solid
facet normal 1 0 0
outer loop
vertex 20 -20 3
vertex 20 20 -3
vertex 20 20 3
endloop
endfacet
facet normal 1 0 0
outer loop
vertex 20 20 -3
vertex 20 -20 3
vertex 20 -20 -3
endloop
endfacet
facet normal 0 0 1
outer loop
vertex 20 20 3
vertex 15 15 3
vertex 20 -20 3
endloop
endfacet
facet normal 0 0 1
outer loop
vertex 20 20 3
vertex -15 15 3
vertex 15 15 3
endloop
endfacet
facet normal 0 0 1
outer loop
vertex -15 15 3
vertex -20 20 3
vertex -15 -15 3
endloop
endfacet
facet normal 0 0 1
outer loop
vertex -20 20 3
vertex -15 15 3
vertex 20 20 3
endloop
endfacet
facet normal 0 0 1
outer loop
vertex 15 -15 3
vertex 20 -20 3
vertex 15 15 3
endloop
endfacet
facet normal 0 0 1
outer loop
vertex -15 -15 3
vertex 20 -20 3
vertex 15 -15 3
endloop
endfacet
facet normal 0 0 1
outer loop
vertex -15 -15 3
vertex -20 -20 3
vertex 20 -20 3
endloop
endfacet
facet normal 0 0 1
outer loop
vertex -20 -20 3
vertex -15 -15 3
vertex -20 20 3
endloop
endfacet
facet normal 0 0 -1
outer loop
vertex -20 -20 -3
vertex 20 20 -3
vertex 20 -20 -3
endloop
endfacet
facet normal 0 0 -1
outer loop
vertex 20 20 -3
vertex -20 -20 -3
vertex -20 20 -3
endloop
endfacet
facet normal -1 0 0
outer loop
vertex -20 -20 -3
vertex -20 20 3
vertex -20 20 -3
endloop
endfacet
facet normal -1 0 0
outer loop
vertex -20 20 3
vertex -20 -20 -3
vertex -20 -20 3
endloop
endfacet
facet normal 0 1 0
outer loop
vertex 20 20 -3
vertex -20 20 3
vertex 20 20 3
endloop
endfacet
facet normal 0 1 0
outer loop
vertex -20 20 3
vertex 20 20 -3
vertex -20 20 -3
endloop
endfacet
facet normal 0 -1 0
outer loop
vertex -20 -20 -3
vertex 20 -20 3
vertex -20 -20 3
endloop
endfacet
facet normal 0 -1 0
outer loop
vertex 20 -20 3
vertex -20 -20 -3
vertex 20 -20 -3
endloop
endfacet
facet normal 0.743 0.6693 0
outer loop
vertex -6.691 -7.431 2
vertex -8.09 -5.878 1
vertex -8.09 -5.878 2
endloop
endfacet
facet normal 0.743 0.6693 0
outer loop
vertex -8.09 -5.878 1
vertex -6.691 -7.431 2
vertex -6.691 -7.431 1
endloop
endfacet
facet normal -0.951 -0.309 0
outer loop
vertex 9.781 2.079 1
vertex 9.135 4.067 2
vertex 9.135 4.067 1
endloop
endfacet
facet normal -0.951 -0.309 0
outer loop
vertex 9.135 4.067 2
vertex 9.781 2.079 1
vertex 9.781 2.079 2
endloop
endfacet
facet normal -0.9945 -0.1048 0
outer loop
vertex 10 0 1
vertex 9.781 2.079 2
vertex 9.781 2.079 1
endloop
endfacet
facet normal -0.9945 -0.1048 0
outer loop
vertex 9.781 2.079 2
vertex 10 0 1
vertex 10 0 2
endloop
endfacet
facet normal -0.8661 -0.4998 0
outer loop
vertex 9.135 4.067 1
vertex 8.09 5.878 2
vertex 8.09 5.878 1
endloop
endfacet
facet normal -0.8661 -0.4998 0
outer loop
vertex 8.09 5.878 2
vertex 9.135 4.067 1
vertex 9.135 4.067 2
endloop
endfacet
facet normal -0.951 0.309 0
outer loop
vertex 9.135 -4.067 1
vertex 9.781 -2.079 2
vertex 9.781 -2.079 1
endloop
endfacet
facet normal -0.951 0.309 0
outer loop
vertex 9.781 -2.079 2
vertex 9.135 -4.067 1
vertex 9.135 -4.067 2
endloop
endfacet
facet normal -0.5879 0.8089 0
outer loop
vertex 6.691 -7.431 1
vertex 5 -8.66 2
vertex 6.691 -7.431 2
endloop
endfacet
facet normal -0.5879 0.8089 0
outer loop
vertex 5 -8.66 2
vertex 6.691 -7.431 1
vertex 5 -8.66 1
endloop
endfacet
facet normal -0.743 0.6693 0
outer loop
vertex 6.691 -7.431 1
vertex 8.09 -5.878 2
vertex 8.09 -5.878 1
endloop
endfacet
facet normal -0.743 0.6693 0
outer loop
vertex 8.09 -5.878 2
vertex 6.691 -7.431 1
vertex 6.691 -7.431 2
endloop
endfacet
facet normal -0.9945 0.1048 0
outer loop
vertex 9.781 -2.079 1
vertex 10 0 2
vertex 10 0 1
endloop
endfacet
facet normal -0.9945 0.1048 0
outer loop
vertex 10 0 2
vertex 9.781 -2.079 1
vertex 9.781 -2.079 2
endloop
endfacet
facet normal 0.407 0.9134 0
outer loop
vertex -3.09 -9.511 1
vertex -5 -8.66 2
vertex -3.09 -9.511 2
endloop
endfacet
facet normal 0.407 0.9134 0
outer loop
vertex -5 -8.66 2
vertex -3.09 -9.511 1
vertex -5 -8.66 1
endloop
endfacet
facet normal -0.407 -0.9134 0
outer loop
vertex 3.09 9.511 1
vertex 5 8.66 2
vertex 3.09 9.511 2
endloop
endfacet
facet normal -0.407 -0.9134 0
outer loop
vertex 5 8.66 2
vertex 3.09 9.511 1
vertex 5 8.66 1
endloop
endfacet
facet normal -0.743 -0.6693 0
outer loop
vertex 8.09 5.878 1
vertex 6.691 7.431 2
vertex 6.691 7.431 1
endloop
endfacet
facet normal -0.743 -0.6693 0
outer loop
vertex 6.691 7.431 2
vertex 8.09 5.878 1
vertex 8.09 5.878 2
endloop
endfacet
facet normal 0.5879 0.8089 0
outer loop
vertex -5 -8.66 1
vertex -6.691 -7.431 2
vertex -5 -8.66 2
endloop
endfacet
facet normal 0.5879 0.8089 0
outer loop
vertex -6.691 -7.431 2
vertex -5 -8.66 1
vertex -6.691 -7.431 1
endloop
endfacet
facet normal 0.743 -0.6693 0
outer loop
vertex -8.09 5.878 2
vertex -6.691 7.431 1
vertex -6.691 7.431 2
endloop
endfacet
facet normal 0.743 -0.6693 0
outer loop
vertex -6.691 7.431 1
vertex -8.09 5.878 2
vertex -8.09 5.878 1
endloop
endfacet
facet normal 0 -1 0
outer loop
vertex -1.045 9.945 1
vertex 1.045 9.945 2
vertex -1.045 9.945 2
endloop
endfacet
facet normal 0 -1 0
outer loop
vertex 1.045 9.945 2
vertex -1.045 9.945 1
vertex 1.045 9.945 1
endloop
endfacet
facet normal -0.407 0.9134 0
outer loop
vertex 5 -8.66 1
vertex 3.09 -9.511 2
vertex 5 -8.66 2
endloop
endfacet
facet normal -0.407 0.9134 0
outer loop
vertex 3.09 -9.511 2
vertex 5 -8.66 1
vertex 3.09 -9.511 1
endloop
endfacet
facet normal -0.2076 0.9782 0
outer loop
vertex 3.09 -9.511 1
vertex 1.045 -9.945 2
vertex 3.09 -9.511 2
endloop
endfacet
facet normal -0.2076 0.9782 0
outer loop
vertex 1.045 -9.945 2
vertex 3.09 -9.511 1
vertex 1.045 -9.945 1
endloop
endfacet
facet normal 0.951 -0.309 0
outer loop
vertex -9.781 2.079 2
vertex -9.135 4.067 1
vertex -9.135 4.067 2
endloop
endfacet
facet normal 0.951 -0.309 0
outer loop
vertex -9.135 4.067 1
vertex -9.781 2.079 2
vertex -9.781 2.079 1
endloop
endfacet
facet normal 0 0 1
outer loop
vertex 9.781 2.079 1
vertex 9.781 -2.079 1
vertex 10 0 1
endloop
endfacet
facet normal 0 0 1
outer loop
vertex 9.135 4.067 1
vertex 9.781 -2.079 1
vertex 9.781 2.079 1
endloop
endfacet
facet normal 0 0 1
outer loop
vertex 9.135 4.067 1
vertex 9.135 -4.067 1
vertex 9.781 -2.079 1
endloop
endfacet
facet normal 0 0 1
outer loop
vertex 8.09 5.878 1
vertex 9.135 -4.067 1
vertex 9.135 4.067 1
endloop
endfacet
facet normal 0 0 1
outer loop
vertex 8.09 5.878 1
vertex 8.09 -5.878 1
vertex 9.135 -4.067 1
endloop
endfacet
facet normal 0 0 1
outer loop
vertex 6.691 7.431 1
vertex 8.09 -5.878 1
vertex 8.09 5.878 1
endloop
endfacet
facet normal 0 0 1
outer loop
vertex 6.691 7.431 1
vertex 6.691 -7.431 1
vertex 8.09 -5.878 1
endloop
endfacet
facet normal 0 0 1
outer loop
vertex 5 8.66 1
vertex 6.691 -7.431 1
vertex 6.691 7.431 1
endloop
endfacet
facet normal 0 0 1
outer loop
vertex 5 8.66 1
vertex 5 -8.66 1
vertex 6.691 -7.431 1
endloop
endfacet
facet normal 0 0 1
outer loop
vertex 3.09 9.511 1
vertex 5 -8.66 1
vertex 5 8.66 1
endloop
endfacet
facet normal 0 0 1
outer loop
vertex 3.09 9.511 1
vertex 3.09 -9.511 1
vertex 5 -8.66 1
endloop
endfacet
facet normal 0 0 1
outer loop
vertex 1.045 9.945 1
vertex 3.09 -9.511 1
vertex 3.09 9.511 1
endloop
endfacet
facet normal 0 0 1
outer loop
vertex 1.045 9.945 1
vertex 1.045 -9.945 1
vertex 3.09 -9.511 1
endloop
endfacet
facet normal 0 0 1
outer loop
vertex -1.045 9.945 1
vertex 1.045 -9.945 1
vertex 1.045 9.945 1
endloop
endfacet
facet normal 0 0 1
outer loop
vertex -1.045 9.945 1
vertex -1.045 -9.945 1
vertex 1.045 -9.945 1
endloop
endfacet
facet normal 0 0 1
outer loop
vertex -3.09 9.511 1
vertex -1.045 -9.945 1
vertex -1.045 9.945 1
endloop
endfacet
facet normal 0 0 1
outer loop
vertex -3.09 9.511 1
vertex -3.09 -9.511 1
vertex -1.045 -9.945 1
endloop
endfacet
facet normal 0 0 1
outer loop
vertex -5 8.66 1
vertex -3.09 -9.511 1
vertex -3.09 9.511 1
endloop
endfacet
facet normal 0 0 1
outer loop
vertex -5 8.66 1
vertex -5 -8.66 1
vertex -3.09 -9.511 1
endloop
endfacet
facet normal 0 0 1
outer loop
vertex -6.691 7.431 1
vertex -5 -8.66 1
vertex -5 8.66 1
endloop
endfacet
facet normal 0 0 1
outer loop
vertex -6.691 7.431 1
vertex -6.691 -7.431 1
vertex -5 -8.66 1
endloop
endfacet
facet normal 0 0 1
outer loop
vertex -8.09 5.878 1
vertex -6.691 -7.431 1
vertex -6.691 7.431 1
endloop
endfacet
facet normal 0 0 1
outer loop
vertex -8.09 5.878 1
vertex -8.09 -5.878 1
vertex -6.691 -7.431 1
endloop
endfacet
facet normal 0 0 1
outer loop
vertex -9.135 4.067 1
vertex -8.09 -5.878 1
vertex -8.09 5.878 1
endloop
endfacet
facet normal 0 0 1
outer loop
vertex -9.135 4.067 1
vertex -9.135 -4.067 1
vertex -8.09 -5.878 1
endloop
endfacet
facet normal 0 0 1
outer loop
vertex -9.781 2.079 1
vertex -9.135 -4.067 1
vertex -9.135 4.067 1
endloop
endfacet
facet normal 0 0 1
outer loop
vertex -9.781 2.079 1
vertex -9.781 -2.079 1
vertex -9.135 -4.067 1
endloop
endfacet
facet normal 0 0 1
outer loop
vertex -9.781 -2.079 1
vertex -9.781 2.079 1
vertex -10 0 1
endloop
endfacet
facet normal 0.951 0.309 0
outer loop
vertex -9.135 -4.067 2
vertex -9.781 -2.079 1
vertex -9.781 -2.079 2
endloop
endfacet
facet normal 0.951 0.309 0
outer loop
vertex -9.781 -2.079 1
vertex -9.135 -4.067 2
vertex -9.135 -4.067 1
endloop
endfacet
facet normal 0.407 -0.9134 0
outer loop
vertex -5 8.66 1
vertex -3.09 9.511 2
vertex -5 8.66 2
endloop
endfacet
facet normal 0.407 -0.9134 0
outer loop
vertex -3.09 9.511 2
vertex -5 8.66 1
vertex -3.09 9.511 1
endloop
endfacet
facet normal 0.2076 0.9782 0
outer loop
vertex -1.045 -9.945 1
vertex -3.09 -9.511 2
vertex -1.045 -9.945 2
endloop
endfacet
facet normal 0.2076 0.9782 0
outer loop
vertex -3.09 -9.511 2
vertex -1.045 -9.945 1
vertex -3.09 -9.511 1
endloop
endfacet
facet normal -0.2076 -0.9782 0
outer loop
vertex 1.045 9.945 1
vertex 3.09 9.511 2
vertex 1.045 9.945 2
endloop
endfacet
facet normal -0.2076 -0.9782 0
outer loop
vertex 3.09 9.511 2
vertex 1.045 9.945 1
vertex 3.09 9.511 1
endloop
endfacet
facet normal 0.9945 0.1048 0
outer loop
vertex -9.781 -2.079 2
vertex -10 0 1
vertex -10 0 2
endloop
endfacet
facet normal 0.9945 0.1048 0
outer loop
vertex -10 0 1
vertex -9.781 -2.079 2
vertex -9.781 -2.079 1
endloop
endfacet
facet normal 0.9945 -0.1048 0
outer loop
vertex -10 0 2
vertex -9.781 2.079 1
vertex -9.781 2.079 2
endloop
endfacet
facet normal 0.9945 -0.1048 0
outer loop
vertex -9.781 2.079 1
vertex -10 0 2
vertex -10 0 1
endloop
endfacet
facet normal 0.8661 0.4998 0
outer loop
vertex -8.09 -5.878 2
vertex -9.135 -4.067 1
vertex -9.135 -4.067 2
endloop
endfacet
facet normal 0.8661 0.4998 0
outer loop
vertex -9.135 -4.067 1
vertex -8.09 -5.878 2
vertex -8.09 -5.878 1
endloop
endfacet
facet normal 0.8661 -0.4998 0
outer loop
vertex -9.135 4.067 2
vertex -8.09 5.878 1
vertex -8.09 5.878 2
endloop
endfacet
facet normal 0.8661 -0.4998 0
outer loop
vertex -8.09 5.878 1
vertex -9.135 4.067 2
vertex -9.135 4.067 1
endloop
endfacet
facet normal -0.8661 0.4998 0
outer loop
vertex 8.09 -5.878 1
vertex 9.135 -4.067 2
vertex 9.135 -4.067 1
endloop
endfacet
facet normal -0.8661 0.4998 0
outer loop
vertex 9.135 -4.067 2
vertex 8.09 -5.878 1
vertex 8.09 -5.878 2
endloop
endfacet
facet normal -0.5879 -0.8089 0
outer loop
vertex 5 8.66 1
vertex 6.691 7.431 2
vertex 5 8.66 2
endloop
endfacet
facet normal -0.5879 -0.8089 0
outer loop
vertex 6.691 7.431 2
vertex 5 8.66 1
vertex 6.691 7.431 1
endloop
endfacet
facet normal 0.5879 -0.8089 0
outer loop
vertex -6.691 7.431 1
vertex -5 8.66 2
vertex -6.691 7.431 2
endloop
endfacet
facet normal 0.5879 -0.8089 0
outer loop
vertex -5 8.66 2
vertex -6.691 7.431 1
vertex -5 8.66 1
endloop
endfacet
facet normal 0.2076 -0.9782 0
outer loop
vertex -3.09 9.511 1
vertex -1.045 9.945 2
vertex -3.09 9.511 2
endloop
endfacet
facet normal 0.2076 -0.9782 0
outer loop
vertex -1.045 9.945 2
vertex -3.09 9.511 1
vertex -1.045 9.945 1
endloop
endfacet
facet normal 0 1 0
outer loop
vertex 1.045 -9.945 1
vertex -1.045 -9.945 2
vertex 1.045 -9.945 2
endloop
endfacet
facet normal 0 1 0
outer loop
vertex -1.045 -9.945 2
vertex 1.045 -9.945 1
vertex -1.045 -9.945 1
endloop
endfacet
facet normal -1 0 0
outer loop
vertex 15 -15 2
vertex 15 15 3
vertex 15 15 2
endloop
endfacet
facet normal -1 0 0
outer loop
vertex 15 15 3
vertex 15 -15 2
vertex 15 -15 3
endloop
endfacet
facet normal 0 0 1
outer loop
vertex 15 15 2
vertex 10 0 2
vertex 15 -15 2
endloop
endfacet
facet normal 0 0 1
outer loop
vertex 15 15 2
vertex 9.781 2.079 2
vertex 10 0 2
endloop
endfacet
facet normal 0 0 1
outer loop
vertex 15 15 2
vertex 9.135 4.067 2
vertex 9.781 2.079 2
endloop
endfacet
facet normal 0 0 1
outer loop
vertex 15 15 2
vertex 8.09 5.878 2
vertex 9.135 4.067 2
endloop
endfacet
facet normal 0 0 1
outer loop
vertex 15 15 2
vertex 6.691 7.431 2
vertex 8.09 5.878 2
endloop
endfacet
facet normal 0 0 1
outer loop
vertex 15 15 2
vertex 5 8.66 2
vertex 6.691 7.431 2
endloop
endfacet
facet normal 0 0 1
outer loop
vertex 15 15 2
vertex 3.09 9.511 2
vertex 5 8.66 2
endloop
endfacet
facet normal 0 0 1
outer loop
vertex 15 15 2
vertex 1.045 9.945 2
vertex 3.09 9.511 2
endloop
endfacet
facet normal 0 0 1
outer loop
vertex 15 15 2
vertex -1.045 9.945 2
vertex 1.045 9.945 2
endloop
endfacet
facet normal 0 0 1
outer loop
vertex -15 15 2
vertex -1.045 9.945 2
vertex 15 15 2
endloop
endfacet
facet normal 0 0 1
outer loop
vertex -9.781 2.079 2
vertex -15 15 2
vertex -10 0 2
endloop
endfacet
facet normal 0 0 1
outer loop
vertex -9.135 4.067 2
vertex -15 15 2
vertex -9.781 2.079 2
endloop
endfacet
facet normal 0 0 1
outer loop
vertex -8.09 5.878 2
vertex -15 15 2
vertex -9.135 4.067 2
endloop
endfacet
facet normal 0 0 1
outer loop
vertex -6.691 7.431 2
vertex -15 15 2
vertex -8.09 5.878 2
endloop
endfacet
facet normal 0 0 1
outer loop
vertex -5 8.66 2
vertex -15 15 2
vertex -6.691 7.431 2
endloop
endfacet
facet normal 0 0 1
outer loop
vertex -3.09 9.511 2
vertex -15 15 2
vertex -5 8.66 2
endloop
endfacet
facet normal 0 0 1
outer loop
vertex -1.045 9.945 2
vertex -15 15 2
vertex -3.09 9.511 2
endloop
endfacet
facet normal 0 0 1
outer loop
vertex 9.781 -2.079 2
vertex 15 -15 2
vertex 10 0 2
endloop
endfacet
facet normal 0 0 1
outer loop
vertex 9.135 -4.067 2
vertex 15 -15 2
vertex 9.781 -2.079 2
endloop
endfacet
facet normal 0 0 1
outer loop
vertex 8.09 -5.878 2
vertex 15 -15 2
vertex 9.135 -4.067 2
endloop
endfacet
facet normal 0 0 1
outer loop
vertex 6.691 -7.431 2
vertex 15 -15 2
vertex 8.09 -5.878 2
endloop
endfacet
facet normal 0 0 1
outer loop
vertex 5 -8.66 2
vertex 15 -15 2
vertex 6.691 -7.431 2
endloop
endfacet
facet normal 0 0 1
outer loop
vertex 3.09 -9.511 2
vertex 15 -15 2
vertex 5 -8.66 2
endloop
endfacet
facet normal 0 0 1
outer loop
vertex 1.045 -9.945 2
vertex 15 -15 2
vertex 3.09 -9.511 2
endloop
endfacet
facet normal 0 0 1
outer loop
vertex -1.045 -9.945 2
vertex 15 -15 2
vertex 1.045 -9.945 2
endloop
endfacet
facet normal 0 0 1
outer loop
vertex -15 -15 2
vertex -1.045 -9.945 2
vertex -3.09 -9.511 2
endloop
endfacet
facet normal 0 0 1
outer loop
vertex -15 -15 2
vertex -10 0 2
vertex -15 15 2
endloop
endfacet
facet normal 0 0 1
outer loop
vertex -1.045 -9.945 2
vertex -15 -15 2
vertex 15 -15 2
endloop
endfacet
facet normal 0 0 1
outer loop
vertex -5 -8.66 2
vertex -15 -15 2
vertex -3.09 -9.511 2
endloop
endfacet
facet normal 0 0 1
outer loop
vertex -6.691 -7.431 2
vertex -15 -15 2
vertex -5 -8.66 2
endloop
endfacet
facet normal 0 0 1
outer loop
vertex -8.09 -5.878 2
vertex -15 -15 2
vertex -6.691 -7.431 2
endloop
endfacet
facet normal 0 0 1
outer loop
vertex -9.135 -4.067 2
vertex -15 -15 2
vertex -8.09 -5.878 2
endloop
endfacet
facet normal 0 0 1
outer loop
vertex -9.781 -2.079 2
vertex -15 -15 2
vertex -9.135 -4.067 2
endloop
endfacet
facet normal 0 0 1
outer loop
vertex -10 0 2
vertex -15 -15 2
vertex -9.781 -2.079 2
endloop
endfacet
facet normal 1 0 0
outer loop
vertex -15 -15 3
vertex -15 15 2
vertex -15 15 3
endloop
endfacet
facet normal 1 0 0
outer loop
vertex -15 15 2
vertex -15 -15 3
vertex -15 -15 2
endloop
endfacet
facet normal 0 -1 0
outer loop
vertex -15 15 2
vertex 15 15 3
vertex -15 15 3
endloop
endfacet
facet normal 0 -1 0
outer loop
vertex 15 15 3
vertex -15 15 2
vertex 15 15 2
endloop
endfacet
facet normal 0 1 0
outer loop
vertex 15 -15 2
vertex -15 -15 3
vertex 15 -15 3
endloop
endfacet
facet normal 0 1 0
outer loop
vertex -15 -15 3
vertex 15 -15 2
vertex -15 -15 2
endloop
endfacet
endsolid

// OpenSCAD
difference()
{
    cube([ 40, 40, 6 ], center = true);
    translate([ 0, 0, 2 ]) cylinder(r = 10, h = 2, center = true);
    translate([ 0, 0, 2.5 ]) cube([ 30, 30, 1 ], center = true);
}
